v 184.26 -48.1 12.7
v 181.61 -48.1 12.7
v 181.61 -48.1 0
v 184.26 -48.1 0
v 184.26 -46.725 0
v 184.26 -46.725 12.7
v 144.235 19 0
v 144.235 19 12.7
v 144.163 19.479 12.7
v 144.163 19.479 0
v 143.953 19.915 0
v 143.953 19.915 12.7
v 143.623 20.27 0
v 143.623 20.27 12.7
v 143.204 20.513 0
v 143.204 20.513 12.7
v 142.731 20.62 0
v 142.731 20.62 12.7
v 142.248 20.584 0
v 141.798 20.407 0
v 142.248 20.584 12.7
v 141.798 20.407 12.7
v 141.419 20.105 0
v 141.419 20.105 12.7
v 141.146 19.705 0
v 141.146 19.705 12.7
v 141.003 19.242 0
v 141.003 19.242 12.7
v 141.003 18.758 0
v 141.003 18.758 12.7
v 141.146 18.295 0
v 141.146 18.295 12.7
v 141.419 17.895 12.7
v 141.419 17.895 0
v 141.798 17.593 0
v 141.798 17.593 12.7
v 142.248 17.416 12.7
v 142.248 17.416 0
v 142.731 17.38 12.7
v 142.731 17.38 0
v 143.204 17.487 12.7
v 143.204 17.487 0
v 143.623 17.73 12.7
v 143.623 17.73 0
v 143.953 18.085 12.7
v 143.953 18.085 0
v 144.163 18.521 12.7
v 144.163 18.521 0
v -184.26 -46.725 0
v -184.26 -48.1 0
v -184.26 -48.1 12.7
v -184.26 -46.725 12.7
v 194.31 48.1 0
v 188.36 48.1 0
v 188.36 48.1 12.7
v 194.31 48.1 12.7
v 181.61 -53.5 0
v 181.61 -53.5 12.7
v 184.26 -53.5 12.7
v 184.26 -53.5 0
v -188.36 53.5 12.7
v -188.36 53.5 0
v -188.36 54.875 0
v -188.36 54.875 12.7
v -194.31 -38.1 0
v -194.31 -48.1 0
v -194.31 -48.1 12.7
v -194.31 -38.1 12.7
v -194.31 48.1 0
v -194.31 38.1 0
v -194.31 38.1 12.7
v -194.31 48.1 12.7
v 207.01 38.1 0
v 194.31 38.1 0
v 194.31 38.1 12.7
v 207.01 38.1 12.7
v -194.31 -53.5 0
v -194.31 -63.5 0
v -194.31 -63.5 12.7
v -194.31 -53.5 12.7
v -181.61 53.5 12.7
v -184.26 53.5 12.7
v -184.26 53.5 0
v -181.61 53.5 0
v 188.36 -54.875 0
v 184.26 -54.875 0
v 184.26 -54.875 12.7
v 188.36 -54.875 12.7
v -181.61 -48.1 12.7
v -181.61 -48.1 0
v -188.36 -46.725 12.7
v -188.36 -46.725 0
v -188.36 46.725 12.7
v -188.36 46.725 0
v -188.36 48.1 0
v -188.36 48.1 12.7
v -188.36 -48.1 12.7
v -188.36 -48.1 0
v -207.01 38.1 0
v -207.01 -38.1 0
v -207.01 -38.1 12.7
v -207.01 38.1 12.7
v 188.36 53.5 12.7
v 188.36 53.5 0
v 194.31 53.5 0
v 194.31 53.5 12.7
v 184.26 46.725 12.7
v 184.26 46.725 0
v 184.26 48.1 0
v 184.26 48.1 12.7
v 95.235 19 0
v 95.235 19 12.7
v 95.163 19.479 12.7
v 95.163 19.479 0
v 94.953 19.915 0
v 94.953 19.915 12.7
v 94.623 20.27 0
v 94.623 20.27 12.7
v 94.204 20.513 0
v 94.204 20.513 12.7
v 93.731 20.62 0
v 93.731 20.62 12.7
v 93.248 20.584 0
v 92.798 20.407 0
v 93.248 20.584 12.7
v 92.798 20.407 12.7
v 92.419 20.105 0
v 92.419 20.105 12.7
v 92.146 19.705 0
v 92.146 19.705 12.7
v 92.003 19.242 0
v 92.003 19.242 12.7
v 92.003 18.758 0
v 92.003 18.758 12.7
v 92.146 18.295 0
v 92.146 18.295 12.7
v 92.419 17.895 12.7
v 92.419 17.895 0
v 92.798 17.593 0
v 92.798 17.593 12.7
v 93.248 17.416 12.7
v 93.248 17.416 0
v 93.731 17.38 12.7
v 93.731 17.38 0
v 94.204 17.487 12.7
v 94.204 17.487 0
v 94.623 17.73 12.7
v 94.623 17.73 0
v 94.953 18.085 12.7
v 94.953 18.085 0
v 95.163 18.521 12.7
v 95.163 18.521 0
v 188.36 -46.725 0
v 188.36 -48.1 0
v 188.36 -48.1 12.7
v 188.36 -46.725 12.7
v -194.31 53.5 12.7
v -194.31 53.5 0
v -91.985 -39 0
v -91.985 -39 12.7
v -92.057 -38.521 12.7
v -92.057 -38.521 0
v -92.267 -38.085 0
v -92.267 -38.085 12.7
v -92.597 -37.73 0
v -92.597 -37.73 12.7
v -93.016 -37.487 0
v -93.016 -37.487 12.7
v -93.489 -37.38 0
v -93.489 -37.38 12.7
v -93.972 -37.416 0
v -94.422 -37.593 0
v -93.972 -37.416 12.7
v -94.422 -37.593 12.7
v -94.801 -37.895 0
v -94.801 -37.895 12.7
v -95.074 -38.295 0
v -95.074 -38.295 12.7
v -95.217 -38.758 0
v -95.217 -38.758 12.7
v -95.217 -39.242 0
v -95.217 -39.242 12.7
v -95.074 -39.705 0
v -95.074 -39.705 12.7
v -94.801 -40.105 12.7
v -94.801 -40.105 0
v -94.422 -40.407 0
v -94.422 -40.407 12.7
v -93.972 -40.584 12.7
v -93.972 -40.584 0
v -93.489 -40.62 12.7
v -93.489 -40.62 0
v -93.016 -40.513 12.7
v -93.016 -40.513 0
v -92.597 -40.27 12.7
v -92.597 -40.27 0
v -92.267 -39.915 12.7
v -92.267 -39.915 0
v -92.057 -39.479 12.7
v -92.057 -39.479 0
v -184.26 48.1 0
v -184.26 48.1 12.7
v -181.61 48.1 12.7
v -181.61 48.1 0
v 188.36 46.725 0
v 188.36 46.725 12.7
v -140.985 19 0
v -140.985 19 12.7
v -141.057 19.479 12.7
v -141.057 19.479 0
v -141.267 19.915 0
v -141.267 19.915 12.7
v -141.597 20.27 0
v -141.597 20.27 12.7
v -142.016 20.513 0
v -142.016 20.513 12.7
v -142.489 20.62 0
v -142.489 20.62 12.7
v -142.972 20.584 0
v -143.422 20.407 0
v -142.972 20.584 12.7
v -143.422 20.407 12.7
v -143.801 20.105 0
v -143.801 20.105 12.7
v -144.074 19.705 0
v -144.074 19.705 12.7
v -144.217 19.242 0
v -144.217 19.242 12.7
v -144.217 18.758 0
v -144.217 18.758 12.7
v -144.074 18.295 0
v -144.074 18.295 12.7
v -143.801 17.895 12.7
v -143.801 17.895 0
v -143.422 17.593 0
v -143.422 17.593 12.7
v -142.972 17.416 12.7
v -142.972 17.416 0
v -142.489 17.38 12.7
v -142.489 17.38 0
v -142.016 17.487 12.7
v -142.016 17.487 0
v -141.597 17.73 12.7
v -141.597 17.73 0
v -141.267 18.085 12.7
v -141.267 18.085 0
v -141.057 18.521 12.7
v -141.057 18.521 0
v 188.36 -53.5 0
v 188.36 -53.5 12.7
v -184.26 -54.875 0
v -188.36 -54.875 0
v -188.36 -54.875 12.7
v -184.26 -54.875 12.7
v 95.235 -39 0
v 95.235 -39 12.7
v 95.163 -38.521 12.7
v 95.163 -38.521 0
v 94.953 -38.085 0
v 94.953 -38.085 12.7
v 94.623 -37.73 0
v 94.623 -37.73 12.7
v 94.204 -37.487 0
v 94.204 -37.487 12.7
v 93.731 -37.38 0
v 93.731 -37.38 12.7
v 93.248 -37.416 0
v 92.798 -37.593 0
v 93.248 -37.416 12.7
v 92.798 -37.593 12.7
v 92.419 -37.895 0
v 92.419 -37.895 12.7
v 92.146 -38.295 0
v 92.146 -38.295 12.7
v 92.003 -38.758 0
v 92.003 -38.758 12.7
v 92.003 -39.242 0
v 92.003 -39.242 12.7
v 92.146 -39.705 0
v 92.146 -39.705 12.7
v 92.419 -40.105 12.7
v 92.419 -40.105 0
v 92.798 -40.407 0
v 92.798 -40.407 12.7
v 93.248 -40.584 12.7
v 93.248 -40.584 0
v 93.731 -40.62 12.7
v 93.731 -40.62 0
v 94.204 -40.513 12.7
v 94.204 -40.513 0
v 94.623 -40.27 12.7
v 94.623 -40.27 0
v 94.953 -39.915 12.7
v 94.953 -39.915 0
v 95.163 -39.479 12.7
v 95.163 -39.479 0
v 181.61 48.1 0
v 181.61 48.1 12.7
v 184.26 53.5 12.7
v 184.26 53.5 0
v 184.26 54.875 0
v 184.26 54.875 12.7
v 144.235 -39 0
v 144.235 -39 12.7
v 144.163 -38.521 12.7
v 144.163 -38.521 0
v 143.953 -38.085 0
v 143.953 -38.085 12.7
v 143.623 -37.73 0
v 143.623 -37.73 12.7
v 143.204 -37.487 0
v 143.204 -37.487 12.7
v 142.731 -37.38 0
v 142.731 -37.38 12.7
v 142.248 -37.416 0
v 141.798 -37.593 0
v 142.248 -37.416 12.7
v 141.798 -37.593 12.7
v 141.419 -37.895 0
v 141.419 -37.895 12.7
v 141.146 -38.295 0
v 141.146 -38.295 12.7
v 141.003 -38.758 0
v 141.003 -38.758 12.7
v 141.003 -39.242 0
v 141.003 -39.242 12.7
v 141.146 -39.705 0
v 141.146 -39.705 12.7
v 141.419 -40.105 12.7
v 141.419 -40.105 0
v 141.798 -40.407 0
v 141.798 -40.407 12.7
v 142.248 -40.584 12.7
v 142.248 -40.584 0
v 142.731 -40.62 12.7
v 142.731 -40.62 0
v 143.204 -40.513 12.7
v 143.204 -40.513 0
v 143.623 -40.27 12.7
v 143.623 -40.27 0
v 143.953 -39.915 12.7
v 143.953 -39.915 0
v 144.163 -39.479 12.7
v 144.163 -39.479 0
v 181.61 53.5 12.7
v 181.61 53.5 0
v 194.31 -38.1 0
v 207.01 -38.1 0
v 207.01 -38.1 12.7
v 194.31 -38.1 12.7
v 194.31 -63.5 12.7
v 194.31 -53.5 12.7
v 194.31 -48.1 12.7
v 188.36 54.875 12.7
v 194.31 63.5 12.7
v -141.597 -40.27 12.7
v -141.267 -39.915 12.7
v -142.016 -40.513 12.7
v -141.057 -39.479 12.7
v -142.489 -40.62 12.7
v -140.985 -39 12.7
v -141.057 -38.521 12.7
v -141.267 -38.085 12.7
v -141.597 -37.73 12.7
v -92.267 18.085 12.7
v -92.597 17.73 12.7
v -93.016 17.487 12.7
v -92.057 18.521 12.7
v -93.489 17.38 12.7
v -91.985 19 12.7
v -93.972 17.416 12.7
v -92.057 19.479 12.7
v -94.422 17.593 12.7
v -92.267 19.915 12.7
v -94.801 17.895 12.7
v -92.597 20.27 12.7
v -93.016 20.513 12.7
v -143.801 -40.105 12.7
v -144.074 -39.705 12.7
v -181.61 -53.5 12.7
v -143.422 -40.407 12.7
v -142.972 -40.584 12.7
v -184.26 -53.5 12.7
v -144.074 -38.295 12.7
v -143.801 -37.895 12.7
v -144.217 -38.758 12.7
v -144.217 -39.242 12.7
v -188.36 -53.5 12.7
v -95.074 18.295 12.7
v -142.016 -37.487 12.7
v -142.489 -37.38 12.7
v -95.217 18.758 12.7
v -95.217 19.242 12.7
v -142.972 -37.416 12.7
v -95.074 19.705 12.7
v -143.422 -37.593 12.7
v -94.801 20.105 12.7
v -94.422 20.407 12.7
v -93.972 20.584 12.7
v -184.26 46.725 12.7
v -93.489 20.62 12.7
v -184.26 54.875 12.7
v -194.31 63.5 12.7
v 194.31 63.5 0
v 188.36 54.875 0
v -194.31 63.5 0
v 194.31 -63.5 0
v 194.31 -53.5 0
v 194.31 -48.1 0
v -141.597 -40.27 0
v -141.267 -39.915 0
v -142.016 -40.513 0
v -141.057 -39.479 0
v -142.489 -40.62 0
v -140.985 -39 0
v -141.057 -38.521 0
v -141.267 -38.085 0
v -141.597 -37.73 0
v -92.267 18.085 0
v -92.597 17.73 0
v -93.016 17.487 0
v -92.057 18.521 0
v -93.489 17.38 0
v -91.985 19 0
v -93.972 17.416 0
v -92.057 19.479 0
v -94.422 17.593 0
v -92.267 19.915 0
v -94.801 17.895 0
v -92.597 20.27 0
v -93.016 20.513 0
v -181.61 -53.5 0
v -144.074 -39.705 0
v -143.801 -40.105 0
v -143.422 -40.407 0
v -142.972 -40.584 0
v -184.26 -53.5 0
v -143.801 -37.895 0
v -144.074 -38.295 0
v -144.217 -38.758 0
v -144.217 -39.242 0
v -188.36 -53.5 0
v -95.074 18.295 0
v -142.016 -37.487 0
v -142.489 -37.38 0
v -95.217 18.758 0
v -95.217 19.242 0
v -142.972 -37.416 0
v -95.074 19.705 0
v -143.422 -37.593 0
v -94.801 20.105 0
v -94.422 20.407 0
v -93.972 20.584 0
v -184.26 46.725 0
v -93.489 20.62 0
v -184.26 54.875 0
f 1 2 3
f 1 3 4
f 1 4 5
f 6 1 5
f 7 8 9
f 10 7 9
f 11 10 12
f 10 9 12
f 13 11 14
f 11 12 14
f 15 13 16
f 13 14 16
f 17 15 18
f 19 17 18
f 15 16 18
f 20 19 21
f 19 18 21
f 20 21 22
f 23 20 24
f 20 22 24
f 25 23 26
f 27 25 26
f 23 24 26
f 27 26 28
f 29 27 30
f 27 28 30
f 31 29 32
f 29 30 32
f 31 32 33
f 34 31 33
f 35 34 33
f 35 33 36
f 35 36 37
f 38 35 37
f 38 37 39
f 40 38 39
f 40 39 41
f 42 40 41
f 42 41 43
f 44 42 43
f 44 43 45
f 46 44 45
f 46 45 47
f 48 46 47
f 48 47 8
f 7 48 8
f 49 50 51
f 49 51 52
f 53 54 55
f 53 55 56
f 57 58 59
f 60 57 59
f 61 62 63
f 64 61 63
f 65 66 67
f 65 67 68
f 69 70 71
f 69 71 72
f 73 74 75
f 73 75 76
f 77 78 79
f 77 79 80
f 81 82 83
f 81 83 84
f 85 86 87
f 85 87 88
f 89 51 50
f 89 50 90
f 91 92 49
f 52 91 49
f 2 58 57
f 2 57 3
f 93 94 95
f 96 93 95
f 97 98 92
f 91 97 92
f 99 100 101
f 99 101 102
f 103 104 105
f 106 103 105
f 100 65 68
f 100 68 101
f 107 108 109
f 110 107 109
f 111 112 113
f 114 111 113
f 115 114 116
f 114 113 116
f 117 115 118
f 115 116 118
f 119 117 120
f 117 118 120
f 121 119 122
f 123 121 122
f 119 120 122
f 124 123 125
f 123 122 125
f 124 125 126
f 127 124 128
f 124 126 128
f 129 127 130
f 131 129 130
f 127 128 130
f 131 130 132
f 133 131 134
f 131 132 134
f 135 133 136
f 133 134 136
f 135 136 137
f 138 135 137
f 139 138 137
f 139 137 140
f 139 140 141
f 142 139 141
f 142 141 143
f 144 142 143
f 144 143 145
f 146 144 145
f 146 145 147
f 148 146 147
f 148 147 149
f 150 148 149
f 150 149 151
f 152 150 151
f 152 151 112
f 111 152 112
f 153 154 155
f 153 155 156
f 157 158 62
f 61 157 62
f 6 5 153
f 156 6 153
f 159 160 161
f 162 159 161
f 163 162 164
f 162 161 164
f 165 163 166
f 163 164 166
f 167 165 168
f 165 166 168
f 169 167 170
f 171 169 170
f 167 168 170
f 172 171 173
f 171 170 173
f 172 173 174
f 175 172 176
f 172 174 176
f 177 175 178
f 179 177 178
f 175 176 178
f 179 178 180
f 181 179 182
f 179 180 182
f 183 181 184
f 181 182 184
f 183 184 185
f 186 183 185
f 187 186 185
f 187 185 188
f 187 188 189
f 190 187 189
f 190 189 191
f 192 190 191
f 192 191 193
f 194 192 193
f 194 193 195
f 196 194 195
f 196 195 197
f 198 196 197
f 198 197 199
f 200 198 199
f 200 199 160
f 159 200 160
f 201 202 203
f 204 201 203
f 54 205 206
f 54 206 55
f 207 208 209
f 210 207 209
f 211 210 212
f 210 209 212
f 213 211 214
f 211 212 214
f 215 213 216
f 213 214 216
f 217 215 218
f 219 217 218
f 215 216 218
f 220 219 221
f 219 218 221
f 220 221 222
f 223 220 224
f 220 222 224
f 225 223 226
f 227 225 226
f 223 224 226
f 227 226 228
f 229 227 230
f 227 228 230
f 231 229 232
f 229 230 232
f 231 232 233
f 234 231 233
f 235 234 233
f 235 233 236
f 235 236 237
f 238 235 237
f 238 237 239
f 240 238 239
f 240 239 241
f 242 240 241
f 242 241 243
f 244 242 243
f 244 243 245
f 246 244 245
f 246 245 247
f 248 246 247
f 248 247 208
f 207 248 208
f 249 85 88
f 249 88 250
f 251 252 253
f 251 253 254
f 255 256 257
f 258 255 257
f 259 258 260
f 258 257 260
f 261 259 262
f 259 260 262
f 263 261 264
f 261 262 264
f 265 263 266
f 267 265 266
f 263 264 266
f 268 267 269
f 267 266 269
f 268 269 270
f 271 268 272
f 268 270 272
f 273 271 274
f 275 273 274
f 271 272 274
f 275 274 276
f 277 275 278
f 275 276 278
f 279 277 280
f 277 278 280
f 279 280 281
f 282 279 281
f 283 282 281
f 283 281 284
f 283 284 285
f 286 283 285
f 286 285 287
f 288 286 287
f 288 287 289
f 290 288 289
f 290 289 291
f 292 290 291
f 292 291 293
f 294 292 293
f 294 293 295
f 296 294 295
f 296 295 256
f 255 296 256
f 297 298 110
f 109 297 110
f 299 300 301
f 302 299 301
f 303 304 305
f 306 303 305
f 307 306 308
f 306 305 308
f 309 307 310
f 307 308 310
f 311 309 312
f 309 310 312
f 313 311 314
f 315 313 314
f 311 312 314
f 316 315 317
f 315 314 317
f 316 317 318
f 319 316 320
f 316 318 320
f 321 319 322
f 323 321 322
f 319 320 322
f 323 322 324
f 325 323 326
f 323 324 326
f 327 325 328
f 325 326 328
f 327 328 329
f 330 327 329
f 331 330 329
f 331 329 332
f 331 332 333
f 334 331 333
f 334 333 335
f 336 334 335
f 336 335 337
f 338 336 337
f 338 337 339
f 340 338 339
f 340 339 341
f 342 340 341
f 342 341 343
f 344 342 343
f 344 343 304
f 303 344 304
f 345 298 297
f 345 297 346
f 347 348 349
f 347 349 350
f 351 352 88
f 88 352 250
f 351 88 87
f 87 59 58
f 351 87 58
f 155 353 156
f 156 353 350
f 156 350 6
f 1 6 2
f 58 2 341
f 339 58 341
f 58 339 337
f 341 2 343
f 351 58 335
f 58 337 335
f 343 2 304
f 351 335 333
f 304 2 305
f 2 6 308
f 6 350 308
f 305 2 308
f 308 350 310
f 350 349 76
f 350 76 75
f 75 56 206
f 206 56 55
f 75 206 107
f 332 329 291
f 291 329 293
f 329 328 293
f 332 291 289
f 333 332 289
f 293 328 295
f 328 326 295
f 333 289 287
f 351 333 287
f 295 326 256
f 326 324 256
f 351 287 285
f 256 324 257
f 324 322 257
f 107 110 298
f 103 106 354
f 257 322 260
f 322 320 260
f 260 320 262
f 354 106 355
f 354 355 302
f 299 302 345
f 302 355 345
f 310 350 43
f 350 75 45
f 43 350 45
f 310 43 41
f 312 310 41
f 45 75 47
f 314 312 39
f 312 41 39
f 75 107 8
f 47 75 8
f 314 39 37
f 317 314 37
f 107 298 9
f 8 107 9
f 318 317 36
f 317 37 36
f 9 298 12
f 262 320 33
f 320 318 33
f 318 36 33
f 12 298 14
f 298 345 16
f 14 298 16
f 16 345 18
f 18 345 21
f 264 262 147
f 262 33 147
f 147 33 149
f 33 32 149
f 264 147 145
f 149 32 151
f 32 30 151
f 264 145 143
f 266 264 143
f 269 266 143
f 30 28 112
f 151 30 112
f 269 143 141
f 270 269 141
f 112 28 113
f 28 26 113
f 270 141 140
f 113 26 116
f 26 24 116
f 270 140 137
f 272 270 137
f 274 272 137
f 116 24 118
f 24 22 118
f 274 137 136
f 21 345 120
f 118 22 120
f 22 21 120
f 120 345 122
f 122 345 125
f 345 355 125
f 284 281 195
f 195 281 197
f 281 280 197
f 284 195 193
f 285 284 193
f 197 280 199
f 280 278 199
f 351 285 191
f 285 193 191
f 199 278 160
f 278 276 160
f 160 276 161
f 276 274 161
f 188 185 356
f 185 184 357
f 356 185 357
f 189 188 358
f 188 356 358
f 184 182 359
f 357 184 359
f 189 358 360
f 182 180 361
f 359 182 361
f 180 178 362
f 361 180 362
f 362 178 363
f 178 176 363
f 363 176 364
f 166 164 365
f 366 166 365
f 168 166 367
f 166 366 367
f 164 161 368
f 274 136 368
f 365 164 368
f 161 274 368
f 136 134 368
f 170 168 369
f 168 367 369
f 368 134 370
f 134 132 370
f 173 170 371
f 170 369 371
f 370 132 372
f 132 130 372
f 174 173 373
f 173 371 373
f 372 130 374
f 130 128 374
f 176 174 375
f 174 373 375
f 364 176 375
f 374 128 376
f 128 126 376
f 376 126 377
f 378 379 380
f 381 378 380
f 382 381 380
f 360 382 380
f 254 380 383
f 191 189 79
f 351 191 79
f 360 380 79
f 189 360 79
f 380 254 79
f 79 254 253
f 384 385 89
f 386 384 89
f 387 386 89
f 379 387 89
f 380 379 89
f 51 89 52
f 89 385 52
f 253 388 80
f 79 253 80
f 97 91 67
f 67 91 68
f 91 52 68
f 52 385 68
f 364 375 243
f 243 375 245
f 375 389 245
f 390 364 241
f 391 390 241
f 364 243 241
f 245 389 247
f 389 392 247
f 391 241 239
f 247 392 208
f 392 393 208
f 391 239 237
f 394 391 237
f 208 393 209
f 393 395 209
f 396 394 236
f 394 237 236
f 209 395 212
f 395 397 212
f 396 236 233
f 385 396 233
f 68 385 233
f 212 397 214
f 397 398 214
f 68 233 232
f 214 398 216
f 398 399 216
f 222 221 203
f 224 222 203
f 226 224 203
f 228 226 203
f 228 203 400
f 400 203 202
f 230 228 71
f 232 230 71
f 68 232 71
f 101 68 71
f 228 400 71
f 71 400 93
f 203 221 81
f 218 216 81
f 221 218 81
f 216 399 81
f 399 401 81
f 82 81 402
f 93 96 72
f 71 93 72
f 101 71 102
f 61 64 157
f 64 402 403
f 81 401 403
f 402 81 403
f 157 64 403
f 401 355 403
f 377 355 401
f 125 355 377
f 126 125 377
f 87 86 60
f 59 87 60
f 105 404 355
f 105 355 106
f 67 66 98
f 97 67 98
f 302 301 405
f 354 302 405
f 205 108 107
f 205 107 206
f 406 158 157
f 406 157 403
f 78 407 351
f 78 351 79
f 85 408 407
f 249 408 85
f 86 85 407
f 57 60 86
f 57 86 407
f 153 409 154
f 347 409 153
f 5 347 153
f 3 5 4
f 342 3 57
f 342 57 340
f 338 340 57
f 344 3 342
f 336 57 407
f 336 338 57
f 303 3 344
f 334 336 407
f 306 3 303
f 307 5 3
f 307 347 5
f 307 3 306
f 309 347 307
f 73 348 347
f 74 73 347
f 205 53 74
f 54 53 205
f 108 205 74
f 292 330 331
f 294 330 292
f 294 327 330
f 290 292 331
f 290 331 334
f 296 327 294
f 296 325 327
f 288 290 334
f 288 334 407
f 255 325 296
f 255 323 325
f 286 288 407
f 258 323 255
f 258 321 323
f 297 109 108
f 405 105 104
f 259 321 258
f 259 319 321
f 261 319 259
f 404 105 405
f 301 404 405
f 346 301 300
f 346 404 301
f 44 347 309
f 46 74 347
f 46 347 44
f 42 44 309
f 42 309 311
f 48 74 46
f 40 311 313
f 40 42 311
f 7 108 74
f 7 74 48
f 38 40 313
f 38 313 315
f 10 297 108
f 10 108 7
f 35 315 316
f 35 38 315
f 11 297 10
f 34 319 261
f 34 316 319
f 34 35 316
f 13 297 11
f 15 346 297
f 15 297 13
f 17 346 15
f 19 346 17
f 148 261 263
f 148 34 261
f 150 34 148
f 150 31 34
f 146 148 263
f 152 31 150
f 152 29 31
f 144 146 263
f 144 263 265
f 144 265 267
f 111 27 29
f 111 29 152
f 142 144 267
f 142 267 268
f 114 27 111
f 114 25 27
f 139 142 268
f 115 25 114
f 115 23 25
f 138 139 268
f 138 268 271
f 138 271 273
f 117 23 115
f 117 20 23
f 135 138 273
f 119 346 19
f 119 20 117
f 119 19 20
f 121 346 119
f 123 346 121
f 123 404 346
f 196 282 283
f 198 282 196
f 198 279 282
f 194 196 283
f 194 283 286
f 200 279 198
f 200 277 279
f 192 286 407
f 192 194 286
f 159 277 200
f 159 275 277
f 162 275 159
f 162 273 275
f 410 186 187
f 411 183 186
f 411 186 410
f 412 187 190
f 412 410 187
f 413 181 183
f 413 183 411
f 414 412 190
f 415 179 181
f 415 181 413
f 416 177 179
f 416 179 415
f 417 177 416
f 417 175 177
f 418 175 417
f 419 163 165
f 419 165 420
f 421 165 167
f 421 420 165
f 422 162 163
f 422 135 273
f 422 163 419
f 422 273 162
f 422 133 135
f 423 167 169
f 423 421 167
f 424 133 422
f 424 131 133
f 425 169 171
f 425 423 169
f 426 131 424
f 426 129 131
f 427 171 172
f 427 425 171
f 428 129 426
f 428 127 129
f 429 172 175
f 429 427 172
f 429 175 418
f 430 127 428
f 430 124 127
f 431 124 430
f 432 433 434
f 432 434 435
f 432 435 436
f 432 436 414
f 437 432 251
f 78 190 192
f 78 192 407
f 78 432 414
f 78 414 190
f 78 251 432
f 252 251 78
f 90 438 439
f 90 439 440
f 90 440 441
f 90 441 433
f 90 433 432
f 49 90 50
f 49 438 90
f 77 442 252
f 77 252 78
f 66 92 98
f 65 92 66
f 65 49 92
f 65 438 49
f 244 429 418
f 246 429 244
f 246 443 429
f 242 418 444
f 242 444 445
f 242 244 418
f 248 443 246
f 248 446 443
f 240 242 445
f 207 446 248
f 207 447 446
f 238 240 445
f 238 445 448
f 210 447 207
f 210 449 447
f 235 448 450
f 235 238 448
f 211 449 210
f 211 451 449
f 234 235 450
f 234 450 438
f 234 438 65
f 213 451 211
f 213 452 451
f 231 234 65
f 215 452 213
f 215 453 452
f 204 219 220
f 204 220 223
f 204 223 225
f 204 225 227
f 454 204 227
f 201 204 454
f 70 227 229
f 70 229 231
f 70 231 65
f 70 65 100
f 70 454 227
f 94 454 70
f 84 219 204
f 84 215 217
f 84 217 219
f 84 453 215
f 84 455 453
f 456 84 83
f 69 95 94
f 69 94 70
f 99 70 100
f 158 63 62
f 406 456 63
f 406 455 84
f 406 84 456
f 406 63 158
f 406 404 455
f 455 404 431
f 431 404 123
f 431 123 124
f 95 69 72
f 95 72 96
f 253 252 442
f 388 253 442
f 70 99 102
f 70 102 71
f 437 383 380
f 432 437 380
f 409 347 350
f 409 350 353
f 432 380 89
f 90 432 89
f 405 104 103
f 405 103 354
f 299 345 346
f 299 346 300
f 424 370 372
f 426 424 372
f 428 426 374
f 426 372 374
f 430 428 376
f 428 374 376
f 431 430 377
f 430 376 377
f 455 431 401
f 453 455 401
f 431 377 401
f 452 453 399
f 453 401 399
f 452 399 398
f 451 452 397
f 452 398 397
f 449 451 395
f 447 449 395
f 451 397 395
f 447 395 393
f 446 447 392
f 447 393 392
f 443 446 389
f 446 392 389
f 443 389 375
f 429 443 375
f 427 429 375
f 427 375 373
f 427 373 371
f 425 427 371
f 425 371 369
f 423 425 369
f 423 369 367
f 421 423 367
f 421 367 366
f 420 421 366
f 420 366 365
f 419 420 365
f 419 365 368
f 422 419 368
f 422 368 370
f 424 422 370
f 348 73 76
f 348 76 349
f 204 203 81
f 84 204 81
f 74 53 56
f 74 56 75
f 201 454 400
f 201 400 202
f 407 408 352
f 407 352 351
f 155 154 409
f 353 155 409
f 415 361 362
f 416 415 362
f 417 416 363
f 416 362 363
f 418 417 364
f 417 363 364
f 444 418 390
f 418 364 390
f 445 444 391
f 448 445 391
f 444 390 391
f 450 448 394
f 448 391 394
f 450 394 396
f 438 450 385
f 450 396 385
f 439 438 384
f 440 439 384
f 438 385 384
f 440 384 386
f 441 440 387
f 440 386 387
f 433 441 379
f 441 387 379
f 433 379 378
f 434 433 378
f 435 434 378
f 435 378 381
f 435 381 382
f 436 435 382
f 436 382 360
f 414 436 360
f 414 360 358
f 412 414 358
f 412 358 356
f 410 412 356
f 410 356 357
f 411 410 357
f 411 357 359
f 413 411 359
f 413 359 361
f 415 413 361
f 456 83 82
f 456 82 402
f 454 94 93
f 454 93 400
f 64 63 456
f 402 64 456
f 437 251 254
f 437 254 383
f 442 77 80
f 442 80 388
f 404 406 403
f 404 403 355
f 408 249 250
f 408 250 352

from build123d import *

# Parameters (mm, degrees)
BOSS_EXTRUDE1_DEPTH     = 12.7
M5_SHAFT_REACH          = 14.7
SKETCH2_W               = 12.7
SKETCH2_H               = 5.400000122
M5_START                = -12.7
SKETCH3_W               = 4.1
SKETCH3_H               = 8.15
M5_NUT_DEPTH            = 12.7
RASBERRY_PI_HOLES_REACH = 14.7
SKETCH5_R               = 1.625


with BuildPart() as part:
    # Sketch1 → Boss-Extrude1 (new body)
    with BuildSketch(Plane.XY):
        Polygon((194.31, -63.5), (-194.31, -63.5), (-194.31, -38.1), (-207.01, -38.1), (-207.01, 38.1), (-194.31, 38.1), (-194.31, 63.5), (194.31, 63.5), (194.31, 38.1), (207.01, 38.1), (207.01, -38.1), (194.31, -38.1), align=None)
    extrude(amount=BOSS_EXTRUDE1_DEPTH)

    # Sketch2 → m5 shaft (cut, up to next)
    with BuildSketch(Plane.XY.offset(12.7), mode=Mode.PRIVATE) as m5_shaft_sk1:
        with Locations((-187.96, 50.8)):
            Rectangle(SKETCH2_W, SKETCH2_H)
    m5_shaft_tool1 = extrude(m5_shaft_sk1.sketch, amount=-M5_SHAFT_REACH, mode=Mode.PRIVATE) & part.part
    add(m5_shaft_tool1.solids().sort_by_distance((-187.96, 50.8, 12.7))[0], mode=Mode.SUBTRACT)
    # Sketch2 → m5 shaft (cut, up to next)
    with BuildSketch(Plane.XY.offset(12.7), mode=Mode.PRIVATE) as m5_shaft_sk2:
        with Locations((-187.96, -50.8)):
            Rectangle(SKETCH2_W, SKETCH2_H)
    m5_shaft_tool2 = extrude(m5_shaft_sk2.sketch, amount=-M5_SHAFT_REACH, mode=Mode.PRIVATE) & part.part
    add(m5_shaft_tool2.solids().sort_by_distance((-187.96, -50.8, 12.7))[0], mode=Mode.SUBTRACT)
    # Sketch2 → m5 shaft (cut, up to next)
    with BuildSketch(Plane.XY.offset(12.7), mode=Mode.PRIVATE) as m5_shaft_sk3:
        with Locations((187.96, -50.8)):
            Rectangle(SKETCH2_W, SKETCH2_H)
    m5_shaft_tool3 = extrude(m5_shaft_sk3.sketch, amount=-M5_SHAFT_REACH, mode=Mode.PRIVATE) & part.part
    add(m5_shaft_tool3.solids().sort_by_distance((187.96, -50.8, 12.7))[0], mode=Mode.SUBTRACT)
    # Sketch2 → m5 shaft (cut, up to next)
    with BuildSketch(Plane.XY.offset(12.7), mode=Mode.PRIVATE) as m5_shaft_sk4:
        with Locations((187.96, 50.8)):
            Rectangle(SKETCH2_W, SKETCH2_H)
    m5_shaft_tool4 = extrude(m5_shaft_sk4.sketch, amount=-M5_SHAFT_REACH, mode=Mode.PRIVATE) & part.part
    add(m5_shaft_tool4.solids().sort_by_distance((187.96, 50.8, 12.7))[0], mode=Mode.SUBTRACT)

    # Sketch3 → m5 nut (cut)
    with BuildSketch(Plane.XY.offset(12.7).offset(M5_START)):
        with Locations((-186.31, 50.8)):
            Rectangle(SKETCH3_W, SKETCH3_H)
        with Locations((-186.31, -50.8)):
            Rectangle(SKETCH3_W, SKETCH3_H)
        with Locations((186.31, -50.8)):
            Rectangle(SKETCH3_W, SKETCH3_H)
        with Locations((186.31, 50.8)):
            Rectangle(SKETCH3_W, SKETCH3_H)
    extrude(amount=M5_NUT_DEPTH, mode=Mode.SUBTRACT)

    # Sketch5 → rasberry pi holes (cut, up to next)
    with BuildSketch(Plane.XY.offset(12.7), mode=Mode.PRIVATE) as rasberry_pi_holes_sk1:
        with Locations((-142.61, 19)):
            Circle(SKETCH5_R)
    rasberry_pi_holes_tool1 = extrude(rasberry_pi_holes_sk1.sketch, amount=-RASBERRY_PI_HOLES_REACH, mode=Mode.PRIVATE) & part.part
    add(rasberry_pi_holes_tool1.solids().sort_by_distance((-142.61, 19, 12.7))[0], mode=Mode.SUBTRACT)
    # Sketch5 → rasberry pi holes (cut, up to next)
    with BuildSketch(Plane.XY.offset(12.7), mode=Mode.PRIVATE) as rasberry_pi_holes_sk2:
        with Locations((-93.61, 19)):
            Circle(SKETCH5_R)
    rasberry_pi_holes_tool2 = extrude(rasberry_pi_holes_sk2.sketch, amount=-RASBERRY_PI_HOLES_REACH, mode=Mode.PRIVATE) & part.part
    add(rasberry_pi_holes_tool2.solids().sort_by_distance((-93.61, 19, 12.7))[0], mode=Mode.SUBTRACT)
    # Sketch5 → rasberry pi holes (cut, up to next)
    with BuildSketch(Plane.XY.offset(12.7), mode=Mode.PRIVATE) as rasberry_pi_holes_sk3:
        with Locations((-93.61, -39)):
            Circle(SKETCH5_R)
    rasberry_pi_holes_tool3 = extrude(rasberry_pi_holes_sk3.sketch, amount=-RASBERRY_PI_HOLES_REACH, mode=Mode.PRIVATE) & part.part
    add(rasberry_pi_holes_tool3.solids().sort_by_distance((-93.61, -39, 12.7))[0], mode=Mode.SUBTRACT)
    # Sketch5 → rasberry pi holes (cut, up to next)
    with BuildSketch(Plane.XY.offset(12.7), mode=Mode.PRIVATE) as rasberry_pi_holes_sk4:
        with Locations((-142.61, -39)):
            Circle(SKETCH5_R)
    rasberry_pi_holes_tool4 = extrude(rasberry_pi_holes_sk4.sketch, amount=-RASBERRY_PI_HOLES_REACH, mode=Mode.PRIVATE) & part.part
    add(rasberry_pi_holes_tool4.solids().sort_by_distance((-142.61, -39, 12.7))[0], mode=Mode.SUBTRACT)
    # Sketch5 → rasberry pi holes (cut, up to next)
    with BuildSketch(Plane.XY.offset(12.7), mode=Mode.PRIVATE) as rasberry_pi_holes_sk5:
        with Locations((142.61, -39)):
            Circle(SKETCH5_R)
    rasberry_pi_holes_tool5 = extrude(rasberry_pi_holes_sk5.sketch, amount=-RASBERRY_PI_HOLES_REACH, mode=Mode.PRIVATE) & part.part
    add(rasberry_pi_holes_tool5.solids().sort_by_distance((142.61, -39, 12.7))[0], mode=Mode.SUBTRACT)
    # Sketch5 → rasberry pi holes (cut, up to next)
    with BuildSketch(Plane.XY.offset(12.7), mode=Mode.PRIVATE) as rasberry_pi_holes_sk6:
        with Locations((93.61, -39)):
            Circle(SKETCH5_R)
    rasberry_pi_holes_tool6 = extrude(rasberry_pi_holes_sk6.sketch, amount=-RASBERRY_PI_HOLES_REACH, mode=Mode.PRIVATE) & part.part
    add(rasberry_pi_holes_tool6.solids().sort_by_distance((93.61, -39, 12.7))[0], mode=Mode.SUBTRACT)
    # Sketch5 → rasberry pi holes (cut, up to next)
    with BuildSketch(Plane.XY.offset(12.7), mode=Mode.PRIVATE) as rasberry_pi_holes_sk7:
        with Locations((93.61, 19)):
            Circle(SKETCH5_R)
    rasberry_pi_holes_tool7 = extrude(rasberry_pi_holes_sk7.sketch, amount=-RASBERRY_PI_HOLES_REACH, mode=Mode.PRIVATE) & part.part
    add(rasberry_pi_holes_tool7.solids().sort_by_distance((93.61, 19, 12.7))[0], mode=Mode.SUBTRACT)
    # Sketch5 → rasberry pi holes (cut, up to next)
    with BuildSketch(Plane.XY.offset(12.7), mode=Mode.PRIVATE) as rasberry_pi_holes_sk8:
        with Locations((142.61, 19)):
            Circle(SKETCH5_R)
    rasberry_pi_holes_tool8 = extrude(rasberry_pi_holes_sk8.sketch, amount=-RASBERRY_PI_HOLES_REACH, mode=Mode.PRIVATE) & part.part
    add(rasberry_pi_holes_tool8.solids().sort_by_distance((142.61, 19, 12.7))[0], mode=Mode.SUBTRACT)


solid = part.part
